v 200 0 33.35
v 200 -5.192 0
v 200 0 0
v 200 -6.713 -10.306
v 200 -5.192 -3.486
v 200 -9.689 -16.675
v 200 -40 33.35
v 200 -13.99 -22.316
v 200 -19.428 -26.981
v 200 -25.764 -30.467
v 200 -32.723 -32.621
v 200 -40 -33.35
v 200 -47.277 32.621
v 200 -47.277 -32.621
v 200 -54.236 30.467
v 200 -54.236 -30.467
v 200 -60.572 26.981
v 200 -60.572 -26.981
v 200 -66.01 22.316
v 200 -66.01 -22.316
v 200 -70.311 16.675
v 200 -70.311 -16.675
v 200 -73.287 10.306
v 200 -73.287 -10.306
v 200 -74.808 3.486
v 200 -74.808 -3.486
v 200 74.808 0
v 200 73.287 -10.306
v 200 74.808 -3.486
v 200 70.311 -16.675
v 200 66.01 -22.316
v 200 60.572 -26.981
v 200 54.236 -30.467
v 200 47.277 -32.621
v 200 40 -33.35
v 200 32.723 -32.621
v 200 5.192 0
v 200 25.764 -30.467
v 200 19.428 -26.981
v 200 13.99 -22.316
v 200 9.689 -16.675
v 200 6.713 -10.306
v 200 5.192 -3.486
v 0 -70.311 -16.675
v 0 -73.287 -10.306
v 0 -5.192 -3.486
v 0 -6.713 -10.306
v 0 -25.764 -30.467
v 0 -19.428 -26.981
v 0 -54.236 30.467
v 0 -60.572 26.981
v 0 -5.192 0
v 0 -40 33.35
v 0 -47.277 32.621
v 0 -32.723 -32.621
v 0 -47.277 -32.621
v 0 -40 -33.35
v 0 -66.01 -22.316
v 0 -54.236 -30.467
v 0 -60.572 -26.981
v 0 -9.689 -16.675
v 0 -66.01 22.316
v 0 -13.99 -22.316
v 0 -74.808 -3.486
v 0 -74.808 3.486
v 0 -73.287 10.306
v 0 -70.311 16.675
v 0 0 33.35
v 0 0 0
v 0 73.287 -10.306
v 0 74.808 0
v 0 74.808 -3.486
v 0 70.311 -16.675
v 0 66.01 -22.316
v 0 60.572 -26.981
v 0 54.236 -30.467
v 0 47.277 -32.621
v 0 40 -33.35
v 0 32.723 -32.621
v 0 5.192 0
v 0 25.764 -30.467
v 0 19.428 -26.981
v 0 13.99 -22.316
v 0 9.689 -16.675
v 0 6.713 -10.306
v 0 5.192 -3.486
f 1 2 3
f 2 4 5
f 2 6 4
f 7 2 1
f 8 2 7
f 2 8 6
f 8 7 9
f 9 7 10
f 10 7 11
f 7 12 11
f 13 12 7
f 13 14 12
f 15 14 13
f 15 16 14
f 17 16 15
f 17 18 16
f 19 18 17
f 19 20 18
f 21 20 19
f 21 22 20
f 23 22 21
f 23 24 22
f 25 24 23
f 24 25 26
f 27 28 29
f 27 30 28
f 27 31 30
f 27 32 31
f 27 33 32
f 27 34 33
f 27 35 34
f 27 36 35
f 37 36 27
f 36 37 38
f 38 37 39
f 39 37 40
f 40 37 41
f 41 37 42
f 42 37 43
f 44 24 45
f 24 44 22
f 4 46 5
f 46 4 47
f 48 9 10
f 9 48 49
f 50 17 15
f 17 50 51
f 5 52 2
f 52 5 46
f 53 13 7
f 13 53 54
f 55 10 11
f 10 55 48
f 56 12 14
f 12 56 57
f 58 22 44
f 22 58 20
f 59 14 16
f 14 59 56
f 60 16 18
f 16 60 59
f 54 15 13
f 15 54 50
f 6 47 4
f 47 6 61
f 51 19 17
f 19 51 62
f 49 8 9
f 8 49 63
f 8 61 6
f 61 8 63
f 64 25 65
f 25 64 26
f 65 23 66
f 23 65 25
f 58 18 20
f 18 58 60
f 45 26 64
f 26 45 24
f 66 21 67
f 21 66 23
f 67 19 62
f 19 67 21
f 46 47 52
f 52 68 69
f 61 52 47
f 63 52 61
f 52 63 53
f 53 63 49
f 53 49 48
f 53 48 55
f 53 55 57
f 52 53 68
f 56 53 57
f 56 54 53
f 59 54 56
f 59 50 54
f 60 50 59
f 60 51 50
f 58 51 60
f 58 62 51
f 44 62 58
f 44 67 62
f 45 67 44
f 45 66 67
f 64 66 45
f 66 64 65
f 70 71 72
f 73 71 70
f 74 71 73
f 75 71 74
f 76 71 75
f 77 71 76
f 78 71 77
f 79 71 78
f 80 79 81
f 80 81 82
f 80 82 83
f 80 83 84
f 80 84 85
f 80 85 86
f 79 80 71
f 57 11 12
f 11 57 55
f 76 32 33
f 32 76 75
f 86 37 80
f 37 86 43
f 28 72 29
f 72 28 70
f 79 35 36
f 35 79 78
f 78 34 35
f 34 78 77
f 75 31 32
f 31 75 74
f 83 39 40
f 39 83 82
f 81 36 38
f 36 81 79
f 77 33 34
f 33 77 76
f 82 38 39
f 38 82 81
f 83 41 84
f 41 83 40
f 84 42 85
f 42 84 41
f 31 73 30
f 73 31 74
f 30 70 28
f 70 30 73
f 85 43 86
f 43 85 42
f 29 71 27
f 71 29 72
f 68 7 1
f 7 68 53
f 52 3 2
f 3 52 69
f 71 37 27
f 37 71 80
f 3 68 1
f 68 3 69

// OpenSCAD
wall=1.6;

batt_z = 40;
batt_x = 200;
batt_y = 80;

shell_x = batt_x;
shell_y = 150;
shell_z = batt_z + wall;


grip=1;
clearance=2;


gap=wall+0.5;
side_y = (batt_y-shell_y)/2;
side_z = batt_z+wall-clearance-wall-grip/2;

shell_z_line = batt_z-grip*2-clearance-gap/2-wall;

module side(x,y) {
    translate([0,-batt_y/2,0])
    scale([1,side_y/shell_z_line,1])
    rotate([0,90,0])
    cylinder(d=shell_z_line*2,h=shell_x);
}

module sides() {
    side();
    mirror([0,1,0])
    side();
}

module shell(extra, padding) {
    difference() {
        union() {
            translate([0,-batt_y/2,0])
            cube([batt_x,batt_y,shell_z_line]);
            sides();
        }
        cube([shell_x,shell_y,shell_z]);
    }
}

shell();
